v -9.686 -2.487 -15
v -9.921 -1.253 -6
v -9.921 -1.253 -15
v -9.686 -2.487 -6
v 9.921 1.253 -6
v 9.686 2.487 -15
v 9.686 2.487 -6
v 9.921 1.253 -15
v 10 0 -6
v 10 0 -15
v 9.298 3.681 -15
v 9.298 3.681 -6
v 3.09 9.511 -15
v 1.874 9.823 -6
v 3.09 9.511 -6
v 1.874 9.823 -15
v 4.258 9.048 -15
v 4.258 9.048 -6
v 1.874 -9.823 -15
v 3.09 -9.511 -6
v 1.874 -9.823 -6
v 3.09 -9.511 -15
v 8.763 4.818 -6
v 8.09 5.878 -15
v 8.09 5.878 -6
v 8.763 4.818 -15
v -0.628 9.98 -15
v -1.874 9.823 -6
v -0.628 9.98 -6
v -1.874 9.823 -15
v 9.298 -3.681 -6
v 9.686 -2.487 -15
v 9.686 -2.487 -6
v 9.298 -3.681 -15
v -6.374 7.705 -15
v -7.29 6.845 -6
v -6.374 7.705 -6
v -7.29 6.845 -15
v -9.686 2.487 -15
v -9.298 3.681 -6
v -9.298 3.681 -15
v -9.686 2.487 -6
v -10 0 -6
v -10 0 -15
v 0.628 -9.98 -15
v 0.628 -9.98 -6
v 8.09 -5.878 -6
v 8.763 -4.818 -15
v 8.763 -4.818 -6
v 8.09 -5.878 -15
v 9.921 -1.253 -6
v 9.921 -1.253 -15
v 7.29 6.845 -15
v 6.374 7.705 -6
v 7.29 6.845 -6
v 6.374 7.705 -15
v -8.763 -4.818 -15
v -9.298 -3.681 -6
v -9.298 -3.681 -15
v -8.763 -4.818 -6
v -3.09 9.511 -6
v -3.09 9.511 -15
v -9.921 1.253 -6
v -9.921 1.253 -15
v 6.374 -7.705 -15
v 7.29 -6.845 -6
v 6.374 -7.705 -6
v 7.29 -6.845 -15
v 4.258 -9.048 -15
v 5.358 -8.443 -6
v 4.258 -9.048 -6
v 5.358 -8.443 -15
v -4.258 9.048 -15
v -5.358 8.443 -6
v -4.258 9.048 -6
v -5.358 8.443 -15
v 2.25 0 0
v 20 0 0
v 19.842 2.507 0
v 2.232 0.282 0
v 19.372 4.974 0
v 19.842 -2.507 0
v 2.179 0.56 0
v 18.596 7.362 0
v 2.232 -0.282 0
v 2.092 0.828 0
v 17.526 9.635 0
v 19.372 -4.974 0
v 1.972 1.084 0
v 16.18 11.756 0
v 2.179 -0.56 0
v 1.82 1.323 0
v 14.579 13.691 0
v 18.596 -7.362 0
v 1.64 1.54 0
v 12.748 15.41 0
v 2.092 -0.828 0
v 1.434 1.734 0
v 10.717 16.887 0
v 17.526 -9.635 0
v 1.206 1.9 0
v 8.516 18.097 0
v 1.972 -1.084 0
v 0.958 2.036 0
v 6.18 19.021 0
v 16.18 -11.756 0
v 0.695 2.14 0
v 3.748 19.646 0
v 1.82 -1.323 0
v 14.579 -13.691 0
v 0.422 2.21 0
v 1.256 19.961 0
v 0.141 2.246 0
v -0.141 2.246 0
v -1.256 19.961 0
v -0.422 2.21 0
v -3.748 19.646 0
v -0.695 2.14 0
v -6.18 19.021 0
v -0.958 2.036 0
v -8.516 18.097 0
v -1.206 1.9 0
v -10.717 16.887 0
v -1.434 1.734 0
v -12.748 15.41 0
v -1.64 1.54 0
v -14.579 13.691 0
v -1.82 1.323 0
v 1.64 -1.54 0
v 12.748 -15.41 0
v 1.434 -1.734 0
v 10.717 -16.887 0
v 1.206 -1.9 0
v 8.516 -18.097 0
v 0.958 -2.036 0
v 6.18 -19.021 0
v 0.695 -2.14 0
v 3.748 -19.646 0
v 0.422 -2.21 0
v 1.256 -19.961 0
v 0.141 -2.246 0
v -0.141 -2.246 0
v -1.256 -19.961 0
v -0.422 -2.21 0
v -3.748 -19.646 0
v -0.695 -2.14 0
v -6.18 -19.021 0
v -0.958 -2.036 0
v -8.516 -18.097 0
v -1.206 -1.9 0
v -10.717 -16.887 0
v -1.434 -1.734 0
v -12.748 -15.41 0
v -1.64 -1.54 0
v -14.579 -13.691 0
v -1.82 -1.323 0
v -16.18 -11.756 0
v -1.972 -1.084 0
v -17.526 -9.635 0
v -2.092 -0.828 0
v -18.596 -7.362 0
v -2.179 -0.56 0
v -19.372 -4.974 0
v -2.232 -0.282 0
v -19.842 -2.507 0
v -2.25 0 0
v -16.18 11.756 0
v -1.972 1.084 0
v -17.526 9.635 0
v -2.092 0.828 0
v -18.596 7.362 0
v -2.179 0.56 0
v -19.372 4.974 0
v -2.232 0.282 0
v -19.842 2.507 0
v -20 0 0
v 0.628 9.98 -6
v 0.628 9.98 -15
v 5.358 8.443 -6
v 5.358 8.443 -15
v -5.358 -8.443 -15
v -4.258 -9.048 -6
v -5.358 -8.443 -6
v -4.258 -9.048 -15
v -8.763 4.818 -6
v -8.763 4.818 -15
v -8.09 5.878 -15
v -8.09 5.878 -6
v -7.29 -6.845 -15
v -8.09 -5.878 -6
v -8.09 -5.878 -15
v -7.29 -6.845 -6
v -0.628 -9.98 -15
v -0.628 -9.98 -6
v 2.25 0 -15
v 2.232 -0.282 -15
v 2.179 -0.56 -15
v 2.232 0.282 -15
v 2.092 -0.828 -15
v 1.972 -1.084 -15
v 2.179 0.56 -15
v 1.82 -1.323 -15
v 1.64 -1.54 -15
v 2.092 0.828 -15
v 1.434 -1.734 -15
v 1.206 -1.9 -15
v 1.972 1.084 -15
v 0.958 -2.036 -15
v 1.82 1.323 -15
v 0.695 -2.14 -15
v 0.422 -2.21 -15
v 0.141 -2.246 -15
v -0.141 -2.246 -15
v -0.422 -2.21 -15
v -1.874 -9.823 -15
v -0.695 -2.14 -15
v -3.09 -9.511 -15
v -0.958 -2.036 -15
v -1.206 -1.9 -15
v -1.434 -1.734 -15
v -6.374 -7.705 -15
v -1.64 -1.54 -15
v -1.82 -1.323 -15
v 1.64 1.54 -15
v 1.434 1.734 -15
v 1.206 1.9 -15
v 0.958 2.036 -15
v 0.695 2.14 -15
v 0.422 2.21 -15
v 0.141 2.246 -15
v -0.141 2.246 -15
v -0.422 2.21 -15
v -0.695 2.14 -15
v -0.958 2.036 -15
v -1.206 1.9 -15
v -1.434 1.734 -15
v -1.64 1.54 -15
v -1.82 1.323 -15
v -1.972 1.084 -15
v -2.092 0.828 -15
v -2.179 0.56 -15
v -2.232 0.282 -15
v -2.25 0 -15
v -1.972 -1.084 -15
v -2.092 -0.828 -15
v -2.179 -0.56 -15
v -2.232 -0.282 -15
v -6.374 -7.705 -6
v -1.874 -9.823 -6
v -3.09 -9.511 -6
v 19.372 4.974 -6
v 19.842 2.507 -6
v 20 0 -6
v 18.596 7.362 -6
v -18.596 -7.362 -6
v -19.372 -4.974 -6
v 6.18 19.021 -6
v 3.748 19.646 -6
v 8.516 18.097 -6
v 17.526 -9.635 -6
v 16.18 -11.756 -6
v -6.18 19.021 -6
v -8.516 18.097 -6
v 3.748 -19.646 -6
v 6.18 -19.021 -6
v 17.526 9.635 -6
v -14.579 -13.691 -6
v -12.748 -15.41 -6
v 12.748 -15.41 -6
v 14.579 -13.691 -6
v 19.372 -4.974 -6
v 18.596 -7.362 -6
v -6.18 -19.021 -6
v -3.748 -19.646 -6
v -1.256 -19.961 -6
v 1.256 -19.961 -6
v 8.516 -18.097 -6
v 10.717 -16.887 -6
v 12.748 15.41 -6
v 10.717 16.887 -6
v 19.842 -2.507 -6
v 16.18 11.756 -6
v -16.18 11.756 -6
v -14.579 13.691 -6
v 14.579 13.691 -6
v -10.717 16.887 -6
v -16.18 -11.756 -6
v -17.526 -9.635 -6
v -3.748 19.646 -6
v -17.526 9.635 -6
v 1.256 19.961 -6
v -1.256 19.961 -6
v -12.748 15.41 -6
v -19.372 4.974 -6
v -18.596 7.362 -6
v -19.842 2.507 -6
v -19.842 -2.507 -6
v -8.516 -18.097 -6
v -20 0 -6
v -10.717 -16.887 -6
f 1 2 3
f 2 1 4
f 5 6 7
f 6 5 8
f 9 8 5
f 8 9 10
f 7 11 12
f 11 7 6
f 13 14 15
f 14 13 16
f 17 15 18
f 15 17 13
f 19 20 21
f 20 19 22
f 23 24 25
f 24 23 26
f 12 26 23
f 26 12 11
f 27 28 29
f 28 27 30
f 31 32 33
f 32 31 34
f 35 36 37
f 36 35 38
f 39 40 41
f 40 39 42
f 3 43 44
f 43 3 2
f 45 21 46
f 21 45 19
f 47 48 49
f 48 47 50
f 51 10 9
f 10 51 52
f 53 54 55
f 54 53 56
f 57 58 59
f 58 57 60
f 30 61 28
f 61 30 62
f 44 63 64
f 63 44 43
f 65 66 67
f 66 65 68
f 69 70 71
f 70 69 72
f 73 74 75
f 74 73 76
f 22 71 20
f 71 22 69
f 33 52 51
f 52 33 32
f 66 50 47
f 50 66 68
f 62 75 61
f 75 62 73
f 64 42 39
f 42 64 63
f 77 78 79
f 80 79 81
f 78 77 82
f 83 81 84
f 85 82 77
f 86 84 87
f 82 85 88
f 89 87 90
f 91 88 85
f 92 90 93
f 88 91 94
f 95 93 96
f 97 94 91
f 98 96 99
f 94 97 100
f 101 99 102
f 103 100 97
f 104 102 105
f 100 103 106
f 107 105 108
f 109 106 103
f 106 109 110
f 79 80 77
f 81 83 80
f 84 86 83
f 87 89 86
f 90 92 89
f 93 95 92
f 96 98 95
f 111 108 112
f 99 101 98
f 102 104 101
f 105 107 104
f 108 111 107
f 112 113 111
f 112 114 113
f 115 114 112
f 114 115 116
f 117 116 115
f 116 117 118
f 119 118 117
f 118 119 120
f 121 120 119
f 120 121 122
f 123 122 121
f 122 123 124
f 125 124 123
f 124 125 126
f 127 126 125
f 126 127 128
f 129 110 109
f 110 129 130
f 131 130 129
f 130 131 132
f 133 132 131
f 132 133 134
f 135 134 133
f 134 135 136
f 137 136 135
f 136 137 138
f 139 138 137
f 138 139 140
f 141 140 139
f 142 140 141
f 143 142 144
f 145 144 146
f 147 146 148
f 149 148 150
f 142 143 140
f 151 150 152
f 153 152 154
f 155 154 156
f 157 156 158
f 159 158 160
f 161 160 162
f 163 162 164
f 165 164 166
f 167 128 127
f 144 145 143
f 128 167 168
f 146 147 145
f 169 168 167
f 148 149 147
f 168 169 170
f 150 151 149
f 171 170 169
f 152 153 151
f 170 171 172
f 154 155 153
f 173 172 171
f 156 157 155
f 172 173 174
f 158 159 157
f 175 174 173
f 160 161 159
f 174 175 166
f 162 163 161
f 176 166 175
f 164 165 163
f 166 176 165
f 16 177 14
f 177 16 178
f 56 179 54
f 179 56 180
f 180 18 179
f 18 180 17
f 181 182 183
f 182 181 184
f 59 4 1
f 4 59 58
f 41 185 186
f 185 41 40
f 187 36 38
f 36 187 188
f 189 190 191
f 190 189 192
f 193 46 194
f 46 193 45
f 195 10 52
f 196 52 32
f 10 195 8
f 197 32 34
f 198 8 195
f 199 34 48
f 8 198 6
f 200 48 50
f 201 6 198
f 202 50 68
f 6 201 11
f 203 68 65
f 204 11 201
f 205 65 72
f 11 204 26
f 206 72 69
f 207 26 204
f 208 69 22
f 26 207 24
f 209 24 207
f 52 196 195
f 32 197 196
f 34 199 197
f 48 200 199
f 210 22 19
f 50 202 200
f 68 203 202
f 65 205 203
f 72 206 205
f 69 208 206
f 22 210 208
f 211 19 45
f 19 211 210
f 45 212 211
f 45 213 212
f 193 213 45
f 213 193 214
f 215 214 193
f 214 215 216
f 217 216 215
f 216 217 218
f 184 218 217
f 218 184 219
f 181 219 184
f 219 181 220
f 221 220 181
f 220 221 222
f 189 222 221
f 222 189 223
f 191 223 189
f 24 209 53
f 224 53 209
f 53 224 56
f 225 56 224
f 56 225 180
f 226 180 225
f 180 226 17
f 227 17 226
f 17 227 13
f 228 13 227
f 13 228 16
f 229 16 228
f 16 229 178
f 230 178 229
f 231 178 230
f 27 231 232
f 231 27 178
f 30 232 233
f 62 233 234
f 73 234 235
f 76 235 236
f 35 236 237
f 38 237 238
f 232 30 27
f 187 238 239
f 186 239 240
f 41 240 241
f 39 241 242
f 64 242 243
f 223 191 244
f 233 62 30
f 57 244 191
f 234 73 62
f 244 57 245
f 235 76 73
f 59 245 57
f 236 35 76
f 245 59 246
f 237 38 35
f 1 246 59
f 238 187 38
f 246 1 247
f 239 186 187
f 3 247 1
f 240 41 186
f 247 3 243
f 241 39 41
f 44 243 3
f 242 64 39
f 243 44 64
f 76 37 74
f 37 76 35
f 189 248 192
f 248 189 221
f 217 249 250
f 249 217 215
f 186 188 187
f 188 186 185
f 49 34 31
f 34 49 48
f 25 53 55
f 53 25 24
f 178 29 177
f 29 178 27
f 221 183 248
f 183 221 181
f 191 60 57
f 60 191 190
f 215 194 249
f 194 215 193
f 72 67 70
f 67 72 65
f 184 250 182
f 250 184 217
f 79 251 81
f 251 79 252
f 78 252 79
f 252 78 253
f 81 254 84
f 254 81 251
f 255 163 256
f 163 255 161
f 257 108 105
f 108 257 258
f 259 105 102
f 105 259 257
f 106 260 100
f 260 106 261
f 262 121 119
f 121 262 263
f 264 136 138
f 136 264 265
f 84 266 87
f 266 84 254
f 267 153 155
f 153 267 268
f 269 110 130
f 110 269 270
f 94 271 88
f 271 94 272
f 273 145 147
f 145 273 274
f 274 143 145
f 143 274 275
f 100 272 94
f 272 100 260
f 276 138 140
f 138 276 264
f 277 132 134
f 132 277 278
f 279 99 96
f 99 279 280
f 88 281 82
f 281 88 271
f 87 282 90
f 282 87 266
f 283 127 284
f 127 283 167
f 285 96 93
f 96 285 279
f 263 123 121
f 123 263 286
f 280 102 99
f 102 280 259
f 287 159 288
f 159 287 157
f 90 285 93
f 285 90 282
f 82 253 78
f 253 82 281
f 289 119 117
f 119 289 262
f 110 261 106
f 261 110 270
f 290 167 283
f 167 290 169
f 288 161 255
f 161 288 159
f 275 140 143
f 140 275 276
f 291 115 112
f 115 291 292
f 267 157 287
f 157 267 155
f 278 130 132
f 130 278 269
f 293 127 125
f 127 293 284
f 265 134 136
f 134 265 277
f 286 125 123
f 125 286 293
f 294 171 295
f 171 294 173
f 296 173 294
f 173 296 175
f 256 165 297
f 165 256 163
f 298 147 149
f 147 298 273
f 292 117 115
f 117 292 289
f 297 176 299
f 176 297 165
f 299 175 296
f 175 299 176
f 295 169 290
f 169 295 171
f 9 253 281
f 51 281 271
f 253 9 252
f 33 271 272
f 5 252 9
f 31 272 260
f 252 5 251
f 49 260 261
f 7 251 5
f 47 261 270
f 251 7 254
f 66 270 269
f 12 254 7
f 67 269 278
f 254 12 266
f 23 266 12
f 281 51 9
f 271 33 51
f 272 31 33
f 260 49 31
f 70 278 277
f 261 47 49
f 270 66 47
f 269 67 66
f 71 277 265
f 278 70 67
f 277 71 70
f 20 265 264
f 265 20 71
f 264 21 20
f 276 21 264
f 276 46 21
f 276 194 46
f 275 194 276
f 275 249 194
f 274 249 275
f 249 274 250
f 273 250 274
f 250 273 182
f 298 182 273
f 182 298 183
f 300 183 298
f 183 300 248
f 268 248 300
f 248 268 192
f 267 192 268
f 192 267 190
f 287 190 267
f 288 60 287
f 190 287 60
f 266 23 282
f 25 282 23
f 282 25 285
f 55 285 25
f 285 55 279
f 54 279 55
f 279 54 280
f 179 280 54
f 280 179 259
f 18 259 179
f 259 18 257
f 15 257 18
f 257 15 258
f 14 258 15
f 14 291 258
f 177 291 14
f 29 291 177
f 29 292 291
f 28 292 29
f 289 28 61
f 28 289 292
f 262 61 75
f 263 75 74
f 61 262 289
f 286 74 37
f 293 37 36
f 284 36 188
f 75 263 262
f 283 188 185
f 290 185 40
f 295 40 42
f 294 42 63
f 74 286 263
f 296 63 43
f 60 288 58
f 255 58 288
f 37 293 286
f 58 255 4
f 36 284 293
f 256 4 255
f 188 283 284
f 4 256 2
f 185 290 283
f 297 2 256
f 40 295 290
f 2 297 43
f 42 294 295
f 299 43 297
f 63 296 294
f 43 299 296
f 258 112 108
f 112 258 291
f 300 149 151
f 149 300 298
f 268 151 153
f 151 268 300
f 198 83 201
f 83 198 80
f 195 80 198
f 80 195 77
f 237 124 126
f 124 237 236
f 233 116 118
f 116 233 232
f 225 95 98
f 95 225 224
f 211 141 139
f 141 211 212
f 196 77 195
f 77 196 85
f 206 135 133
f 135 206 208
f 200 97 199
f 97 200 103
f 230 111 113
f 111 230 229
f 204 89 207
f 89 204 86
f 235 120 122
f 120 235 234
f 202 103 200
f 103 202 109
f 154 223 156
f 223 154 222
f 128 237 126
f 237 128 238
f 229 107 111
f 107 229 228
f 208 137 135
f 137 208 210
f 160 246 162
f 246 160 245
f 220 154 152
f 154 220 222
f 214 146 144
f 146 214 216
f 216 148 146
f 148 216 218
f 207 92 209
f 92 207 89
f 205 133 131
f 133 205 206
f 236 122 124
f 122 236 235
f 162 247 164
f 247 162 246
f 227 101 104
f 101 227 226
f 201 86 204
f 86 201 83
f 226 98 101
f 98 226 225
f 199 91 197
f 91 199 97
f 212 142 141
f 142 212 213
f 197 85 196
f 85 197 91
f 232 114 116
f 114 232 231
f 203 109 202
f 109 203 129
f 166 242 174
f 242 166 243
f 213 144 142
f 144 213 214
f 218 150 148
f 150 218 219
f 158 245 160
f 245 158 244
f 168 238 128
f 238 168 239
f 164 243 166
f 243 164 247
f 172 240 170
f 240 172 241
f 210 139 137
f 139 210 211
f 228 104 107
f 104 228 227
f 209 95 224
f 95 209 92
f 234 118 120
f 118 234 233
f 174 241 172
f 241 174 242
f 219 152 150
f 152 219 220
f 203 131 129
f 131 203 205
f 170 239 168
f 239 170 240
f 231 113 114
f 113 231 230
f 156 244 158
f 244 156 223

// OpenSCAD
$fn = 50;


difference() {
	union() {
		translate(v = [0, 0, -15.0000000000]) {
			cylinder(h = 15, r = 10.0000000000);
		}
		translate(v = [0, 0, -6.0000000000]) {
			cylinder(h = 6, r = 20.0000000000);
		}
	}
	union() {
		#translate(v = [0, 0, -15]) {
			cylinder(h = 15, r = 2.2500000000);
		}
	}
}
